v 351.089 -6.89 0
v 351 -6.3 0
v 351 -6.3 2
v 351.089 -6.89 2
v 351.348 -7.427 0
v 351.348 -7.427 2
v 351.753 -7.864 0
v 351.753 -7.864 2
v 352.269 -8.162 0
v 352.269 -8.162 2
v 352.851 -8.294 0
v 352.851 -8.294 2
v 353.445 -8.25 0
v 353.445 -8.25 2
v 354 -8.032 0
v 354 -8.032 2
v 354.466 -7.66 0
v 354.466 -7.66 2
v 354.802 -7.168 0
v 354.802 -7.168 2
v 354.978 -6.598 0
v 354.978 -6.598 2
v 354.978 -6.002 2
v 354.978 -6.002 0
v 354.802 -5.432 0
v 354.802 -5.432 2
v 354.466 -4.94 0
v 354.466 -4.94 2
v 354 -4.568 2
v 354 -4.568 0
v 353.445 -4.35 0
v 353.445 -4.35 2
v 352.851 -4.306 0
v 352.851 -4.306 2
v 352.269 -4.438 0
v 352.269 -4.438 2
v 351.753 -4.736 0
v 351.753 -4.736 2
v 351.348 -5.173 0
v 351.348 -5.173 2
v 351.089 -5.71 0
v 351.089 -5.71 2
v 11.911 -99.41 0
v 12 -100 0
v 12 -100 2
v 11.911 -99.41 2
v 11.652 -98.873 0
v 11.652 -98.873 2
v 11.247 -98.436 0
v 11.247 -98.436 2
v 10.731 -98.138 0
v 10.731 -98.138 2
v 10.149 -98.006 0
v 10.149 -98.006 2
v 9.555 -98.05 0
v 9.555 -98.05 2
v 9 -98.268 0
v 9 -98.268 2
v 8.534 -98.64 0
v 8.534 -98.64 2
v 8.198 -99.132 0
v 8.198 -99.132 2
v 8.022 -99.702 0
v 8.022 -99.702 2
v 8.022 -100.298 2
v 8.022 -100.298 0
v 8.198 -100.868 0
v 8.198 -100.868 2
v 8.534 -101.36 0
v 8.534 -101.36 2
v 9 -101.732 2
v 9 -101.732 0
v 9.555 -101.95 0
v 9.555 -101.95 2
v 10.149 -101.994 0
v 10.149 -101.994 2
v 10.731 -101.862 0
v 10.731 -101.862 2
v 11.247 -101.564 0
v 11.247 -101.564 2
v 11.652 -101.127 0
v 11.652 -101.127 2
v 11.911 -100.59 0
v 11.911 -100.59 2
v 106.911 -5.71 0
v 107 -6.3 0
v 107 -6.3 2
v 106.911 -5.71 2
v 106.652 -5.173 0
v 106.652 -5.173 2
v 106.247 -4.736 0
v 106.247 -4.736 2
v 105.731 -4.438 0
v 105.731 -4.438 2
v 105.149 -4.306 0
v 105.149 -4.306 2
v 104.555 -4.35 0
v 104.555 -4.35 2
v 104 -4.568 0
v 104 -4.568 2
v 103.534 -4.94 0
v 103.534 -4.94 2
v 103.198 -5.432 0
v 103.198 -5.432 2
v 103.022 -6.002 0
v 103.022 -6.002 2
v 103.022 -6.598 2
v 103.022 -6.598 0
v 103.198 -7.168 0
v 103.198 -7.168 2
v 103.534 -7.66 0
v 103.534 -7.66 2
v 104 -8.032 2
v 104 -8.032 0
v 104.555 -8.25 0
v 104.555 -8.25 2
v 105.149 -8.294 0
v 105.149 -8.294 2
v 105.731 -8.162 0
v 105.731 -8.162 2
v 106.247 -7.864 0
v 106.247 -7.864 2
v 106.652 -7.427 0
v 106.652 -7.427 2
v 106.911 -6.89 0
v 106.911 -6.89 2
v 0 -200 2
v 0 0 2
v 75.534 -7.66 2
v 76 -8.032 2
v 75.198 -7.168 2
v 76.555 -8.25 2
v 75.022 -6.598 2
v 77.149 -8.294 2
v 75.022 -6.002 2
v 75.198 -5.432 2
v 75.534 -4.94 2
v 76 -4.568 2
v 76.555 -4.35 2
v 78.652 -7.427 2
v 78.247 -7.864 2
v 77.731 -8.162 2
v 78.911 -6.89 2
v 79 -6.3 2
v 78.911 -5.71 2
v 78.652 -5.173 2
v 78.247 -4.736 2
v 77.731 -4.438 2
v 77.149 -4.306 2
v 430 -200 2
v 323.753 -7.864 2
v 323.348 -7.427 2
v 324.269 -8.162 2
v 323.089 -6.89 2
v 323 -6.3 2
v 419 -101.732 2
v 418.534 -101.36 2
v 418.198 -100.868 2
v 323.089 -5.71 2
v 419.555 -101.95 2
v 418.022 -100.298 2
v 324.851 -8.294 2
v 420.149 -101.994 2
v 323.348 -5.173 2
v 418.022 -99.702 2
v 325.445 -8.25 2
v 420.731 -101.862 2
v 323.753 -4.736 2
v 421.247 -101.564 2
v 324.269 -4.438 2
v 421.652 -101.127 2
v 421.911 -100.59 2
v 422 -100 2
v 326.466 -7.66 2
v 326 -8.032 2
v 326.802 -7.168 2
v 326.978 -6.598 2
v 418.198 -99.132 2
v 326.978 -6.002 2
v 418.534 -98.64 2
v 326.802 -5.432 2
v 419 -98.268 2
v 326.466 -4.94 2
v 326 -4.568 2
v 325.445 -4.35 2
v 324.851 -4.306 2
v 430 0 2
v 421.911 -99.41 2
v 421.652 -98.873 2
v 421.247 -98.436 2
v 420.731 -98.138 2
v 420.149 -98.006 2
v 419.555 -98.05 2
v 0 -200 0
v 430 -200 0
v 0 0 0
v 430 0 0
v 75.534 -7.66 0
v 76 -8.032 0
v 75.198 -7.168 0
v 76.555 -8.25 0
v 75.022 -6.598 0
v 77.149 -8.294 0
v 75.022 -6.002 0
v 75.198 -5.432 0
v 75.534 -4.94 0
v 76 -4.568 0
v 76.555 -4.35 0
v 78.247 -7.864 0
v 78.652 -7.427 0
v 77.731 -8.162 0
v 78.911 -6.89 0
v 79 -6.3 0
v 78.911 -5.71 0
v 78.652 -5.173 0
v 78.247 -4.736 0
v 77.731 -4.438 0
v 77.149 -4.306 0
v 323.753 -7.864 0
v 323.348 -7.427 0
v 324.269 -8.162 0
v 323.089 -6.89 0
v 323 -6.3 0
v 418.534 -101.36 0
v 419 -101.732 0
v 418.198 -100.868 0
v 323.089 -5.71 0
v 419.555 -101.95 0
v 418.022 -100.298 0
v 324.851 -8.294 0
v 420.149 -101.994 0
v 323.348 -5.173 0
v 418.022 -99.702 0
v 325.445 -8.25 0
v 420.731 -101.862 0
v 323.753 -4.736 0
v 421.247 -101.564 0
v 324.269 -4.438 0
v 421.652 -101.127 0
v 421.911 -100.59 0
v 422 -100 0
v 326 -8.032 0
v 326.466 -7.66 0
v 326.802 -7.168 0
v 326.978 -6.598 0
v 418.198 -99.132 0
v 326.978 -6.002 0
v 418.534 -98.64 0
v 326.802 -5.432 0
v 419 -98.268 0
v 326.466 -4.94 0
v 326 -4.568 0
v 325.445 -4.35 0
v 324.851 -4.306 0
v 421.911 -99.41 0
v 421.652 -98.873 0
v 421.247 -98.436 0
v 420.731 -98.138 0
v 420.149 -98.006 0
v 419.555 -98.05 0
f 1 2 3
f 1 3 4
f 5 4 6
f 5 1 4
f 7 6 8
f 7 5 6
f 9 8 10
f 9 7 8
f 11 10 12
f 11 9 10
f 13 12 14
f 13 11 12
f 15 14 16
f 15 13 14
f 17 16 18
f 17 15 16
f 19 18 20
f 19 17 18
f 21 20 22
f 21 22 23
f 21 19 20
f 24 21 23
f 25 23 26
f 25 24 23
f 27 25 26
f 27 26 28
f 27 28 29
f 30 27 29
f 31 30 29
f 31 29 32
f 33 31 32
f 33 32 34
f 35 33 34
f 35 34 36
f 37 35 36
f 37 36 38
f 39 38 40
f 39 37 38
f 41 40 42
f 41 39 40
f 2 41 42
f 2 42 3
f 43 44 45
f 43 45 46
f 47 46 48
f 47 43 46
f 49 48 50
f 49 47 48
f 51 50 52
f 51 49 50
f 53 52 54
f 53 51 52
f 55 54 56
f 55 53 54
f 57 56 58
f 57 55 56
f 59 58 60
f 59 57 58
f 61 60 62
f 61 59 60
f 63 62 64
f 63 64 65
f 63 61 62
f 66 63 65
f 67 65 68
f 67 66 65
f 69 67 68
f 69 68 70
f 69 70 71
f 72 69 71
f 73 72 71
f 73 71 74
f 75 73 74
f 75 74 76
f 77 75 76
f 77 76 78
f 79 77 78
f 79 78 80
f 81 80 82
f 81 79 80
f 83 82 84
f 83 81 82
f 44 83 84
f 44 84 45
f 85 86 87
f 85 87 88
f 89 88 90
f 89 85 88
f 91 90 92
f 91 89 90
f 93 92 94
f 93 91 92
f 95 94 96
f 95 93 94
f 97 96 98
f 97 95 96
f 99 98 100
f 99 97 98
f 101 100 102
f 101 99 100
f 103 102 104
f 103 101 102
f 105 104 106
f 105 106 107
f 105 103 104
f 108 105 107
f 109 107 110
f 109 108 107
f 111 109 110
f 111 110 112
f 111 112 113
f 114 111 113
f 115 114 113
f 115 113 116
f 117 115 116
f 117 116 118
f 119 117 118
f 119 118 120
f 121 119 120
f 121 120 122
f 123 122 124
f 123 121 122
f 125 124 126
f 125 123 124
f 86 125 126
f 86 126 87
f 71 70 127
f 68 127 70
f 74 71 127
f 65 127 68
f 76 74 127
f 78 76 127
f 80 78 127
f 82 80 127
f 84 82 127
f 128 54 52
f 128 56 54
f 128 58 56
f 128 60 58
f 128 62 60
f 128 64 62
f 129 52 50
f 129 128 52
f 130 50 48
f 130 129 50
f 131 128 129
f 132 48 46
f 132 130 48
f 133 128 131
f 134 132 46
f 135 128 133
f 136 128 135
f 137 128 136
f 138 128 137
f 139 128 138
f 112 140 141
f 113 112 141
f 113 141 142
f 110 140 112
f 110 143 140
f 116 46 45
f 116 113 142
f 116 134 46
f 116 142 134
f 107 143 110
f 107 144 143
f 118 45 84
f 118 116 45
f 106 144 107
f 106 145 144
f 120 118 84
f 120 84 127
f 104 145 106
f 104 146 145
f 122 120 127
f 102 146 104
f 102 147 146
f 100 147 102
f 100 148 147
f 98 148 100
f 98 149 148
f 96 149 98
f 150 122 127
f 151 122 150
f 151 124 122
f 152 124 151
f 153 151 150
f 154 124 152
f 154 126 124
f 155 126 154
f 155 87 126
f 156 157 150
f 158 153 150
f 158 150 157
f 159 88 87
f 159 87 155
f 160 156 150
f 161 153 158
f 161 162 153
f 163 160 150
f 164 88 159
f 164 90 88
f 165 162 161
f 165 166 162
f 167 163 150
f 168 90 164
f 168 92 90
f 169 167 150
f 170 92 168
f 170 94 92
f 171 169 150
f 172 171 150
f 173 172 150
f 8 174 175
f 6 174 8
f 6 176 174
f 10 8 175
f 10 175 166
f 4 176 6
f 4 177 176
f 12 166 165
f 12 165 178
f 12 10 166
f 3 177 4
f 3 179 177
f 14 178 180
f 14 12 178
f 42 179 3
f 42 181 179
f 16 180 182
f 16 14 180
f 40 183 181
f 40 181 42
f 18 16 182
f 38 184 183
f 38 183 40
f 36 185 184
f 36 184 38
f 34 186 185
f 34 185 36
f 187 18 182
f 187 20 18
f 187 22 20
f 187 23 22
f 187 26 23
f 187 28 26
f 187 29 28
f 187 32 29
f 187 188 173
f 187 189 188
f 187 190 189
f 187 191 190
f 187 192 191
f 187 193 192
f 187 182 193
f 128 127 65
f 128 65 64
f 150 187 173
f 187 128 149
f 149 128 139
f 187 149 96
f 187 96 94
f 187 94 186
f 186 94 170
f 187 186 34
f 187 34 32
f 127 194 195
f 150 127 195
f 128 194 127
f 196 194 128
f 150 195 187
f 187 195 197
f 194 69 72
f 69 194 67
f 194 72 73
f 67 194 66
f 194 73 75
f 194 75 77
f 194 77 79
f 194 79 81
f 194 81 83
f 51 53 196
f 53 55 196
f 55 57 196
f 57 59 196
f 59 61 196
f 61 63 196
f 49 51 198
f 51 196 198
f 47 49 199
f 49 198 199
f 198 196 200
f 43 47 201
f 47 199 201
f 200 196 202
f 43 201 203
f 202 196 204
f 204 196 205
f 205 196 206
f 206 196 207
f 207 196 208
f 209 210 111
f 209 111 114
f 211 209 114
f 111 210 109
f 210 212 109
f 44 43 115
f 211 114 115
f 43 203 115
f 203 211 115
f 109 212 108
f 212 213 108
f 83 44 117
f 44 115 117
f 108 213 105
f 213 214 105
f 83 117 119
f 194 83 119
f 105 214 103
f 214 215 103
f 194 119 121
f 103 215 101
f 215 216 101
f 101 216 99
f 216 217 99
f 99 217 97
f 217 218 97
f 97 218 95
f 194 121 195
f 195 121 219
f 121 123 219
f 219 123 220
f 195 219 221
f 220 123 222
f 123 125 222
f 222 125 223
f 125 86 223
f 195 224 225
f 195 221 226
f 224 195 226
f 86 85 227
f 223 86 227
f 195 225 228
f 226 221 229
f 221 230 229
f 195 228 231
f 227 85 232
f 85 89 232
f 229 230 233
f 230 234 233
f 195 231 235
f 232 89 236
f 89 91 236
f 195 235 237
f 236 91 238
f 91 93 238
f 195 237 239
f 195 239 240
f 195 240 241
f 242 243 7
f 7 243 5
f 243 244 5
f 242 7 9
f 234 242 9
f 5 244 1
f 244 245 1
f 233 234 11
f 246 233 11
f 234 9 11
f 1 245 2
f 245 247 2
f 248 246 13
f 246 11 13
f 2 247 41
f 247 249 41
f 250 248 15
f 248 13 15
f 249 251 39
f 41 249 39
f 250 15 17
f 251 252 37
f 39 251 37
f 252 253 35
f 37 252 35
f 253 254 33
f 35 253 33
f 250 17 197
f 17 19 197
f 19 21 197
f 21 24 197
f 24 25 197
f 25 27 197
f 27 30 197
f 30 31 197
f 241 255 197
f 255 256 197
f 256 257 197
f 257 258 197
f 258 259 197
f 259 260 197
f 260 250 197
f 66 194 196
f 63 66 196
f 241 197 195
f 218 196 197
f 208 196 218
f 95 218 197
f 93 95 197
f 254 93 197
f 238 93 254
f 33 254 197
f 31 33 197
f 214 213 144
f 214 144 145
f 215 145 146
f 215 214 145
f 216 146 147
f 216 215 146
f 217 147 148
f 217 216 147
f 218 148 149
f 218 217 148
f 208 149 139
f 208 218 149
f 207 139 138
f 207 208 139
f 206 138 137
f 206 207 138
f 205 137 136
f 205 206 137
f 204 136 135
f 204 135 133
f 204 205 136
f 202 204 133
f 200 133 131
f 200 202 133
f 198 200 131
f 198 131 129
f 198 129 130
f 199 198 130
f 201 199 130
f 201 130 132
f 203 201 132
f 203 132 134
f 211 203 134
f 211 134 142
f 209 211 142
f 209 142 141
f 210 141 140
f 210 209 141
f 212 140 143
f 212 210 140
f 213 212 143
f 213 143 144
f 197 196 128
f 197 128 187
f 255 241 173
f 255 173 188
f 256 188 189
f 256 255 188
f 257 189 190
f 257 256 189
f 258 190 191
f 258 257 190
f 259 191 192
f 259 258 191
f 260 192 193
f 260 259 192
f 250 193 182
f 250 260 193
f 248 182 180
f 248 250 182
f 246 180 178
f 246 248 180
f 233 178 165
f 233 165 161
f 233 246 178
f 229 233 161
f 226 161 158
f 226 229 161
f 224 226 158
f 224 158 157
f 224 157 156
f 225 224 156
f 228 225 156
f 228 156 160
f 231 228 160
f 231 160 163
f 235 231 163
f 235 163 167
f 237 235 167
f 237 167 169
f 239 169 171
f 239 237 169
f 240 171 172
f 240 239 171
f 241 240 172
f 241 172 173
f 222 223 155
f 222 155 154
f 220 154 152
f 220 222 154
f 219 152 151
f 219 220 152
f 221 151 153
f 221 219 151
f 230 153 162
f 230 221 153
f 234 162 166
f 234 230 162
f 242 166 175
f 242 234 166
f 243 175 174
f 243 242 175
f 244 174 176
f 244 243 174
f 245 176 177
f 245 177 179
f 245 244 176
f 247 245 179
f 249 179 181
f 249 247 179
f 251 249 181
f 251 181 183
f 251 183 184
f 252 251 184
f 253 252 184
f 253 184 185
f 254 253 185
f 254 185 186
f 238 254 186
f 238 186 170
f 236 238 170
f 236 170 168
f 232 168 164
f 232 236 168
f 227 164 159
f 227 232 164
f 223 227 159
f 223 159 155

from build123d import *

# Parameters (mm, degrees)
SKETCH_1_W      = 430
SKETCH_1_H      = 200
SKETCH_1_R      = 2
EXTRUDE_1_DEPTH = 2


with BuildPart() as part:
    # 草图1 → 凸台-拉伸1 (new body)
    with BuildSketch(Plane.XY):
        with Locations((215, -100)):
            Rectangle(SKETCH_1_W, SKETCH_1_H)
        with Locations((10, -100)):
            Circle(SKETCH_1_R, mode=Mode.SUBTRACT)
        with Locations((420, -100)):
            Circle(SKETCH_1_R, mode=Mode.SUBTRACT)
        with Locations((77, -6.3)):
            Circle(SKETCH_1_R, mode=Mode.SUBTRACT)
        with Locations((105, -6.3)):
            Circle(SKETCH_1_R, mode=Mode.SUBTRACT)
        with Locations(Location((325, -6.3, 0), (0, 0, 180))):
            Circle(SKETCH_1_R, mode=Mode.SUBTRACT)
        with Locations(Location((353, -6.3, 0), (0, 0, 180))):
            Circle(SKETCH_1_R, mode=Mode.SUBTRACT)
    extrude(amount=EXTRUDE_1_DEPTH)


solid = part.part
